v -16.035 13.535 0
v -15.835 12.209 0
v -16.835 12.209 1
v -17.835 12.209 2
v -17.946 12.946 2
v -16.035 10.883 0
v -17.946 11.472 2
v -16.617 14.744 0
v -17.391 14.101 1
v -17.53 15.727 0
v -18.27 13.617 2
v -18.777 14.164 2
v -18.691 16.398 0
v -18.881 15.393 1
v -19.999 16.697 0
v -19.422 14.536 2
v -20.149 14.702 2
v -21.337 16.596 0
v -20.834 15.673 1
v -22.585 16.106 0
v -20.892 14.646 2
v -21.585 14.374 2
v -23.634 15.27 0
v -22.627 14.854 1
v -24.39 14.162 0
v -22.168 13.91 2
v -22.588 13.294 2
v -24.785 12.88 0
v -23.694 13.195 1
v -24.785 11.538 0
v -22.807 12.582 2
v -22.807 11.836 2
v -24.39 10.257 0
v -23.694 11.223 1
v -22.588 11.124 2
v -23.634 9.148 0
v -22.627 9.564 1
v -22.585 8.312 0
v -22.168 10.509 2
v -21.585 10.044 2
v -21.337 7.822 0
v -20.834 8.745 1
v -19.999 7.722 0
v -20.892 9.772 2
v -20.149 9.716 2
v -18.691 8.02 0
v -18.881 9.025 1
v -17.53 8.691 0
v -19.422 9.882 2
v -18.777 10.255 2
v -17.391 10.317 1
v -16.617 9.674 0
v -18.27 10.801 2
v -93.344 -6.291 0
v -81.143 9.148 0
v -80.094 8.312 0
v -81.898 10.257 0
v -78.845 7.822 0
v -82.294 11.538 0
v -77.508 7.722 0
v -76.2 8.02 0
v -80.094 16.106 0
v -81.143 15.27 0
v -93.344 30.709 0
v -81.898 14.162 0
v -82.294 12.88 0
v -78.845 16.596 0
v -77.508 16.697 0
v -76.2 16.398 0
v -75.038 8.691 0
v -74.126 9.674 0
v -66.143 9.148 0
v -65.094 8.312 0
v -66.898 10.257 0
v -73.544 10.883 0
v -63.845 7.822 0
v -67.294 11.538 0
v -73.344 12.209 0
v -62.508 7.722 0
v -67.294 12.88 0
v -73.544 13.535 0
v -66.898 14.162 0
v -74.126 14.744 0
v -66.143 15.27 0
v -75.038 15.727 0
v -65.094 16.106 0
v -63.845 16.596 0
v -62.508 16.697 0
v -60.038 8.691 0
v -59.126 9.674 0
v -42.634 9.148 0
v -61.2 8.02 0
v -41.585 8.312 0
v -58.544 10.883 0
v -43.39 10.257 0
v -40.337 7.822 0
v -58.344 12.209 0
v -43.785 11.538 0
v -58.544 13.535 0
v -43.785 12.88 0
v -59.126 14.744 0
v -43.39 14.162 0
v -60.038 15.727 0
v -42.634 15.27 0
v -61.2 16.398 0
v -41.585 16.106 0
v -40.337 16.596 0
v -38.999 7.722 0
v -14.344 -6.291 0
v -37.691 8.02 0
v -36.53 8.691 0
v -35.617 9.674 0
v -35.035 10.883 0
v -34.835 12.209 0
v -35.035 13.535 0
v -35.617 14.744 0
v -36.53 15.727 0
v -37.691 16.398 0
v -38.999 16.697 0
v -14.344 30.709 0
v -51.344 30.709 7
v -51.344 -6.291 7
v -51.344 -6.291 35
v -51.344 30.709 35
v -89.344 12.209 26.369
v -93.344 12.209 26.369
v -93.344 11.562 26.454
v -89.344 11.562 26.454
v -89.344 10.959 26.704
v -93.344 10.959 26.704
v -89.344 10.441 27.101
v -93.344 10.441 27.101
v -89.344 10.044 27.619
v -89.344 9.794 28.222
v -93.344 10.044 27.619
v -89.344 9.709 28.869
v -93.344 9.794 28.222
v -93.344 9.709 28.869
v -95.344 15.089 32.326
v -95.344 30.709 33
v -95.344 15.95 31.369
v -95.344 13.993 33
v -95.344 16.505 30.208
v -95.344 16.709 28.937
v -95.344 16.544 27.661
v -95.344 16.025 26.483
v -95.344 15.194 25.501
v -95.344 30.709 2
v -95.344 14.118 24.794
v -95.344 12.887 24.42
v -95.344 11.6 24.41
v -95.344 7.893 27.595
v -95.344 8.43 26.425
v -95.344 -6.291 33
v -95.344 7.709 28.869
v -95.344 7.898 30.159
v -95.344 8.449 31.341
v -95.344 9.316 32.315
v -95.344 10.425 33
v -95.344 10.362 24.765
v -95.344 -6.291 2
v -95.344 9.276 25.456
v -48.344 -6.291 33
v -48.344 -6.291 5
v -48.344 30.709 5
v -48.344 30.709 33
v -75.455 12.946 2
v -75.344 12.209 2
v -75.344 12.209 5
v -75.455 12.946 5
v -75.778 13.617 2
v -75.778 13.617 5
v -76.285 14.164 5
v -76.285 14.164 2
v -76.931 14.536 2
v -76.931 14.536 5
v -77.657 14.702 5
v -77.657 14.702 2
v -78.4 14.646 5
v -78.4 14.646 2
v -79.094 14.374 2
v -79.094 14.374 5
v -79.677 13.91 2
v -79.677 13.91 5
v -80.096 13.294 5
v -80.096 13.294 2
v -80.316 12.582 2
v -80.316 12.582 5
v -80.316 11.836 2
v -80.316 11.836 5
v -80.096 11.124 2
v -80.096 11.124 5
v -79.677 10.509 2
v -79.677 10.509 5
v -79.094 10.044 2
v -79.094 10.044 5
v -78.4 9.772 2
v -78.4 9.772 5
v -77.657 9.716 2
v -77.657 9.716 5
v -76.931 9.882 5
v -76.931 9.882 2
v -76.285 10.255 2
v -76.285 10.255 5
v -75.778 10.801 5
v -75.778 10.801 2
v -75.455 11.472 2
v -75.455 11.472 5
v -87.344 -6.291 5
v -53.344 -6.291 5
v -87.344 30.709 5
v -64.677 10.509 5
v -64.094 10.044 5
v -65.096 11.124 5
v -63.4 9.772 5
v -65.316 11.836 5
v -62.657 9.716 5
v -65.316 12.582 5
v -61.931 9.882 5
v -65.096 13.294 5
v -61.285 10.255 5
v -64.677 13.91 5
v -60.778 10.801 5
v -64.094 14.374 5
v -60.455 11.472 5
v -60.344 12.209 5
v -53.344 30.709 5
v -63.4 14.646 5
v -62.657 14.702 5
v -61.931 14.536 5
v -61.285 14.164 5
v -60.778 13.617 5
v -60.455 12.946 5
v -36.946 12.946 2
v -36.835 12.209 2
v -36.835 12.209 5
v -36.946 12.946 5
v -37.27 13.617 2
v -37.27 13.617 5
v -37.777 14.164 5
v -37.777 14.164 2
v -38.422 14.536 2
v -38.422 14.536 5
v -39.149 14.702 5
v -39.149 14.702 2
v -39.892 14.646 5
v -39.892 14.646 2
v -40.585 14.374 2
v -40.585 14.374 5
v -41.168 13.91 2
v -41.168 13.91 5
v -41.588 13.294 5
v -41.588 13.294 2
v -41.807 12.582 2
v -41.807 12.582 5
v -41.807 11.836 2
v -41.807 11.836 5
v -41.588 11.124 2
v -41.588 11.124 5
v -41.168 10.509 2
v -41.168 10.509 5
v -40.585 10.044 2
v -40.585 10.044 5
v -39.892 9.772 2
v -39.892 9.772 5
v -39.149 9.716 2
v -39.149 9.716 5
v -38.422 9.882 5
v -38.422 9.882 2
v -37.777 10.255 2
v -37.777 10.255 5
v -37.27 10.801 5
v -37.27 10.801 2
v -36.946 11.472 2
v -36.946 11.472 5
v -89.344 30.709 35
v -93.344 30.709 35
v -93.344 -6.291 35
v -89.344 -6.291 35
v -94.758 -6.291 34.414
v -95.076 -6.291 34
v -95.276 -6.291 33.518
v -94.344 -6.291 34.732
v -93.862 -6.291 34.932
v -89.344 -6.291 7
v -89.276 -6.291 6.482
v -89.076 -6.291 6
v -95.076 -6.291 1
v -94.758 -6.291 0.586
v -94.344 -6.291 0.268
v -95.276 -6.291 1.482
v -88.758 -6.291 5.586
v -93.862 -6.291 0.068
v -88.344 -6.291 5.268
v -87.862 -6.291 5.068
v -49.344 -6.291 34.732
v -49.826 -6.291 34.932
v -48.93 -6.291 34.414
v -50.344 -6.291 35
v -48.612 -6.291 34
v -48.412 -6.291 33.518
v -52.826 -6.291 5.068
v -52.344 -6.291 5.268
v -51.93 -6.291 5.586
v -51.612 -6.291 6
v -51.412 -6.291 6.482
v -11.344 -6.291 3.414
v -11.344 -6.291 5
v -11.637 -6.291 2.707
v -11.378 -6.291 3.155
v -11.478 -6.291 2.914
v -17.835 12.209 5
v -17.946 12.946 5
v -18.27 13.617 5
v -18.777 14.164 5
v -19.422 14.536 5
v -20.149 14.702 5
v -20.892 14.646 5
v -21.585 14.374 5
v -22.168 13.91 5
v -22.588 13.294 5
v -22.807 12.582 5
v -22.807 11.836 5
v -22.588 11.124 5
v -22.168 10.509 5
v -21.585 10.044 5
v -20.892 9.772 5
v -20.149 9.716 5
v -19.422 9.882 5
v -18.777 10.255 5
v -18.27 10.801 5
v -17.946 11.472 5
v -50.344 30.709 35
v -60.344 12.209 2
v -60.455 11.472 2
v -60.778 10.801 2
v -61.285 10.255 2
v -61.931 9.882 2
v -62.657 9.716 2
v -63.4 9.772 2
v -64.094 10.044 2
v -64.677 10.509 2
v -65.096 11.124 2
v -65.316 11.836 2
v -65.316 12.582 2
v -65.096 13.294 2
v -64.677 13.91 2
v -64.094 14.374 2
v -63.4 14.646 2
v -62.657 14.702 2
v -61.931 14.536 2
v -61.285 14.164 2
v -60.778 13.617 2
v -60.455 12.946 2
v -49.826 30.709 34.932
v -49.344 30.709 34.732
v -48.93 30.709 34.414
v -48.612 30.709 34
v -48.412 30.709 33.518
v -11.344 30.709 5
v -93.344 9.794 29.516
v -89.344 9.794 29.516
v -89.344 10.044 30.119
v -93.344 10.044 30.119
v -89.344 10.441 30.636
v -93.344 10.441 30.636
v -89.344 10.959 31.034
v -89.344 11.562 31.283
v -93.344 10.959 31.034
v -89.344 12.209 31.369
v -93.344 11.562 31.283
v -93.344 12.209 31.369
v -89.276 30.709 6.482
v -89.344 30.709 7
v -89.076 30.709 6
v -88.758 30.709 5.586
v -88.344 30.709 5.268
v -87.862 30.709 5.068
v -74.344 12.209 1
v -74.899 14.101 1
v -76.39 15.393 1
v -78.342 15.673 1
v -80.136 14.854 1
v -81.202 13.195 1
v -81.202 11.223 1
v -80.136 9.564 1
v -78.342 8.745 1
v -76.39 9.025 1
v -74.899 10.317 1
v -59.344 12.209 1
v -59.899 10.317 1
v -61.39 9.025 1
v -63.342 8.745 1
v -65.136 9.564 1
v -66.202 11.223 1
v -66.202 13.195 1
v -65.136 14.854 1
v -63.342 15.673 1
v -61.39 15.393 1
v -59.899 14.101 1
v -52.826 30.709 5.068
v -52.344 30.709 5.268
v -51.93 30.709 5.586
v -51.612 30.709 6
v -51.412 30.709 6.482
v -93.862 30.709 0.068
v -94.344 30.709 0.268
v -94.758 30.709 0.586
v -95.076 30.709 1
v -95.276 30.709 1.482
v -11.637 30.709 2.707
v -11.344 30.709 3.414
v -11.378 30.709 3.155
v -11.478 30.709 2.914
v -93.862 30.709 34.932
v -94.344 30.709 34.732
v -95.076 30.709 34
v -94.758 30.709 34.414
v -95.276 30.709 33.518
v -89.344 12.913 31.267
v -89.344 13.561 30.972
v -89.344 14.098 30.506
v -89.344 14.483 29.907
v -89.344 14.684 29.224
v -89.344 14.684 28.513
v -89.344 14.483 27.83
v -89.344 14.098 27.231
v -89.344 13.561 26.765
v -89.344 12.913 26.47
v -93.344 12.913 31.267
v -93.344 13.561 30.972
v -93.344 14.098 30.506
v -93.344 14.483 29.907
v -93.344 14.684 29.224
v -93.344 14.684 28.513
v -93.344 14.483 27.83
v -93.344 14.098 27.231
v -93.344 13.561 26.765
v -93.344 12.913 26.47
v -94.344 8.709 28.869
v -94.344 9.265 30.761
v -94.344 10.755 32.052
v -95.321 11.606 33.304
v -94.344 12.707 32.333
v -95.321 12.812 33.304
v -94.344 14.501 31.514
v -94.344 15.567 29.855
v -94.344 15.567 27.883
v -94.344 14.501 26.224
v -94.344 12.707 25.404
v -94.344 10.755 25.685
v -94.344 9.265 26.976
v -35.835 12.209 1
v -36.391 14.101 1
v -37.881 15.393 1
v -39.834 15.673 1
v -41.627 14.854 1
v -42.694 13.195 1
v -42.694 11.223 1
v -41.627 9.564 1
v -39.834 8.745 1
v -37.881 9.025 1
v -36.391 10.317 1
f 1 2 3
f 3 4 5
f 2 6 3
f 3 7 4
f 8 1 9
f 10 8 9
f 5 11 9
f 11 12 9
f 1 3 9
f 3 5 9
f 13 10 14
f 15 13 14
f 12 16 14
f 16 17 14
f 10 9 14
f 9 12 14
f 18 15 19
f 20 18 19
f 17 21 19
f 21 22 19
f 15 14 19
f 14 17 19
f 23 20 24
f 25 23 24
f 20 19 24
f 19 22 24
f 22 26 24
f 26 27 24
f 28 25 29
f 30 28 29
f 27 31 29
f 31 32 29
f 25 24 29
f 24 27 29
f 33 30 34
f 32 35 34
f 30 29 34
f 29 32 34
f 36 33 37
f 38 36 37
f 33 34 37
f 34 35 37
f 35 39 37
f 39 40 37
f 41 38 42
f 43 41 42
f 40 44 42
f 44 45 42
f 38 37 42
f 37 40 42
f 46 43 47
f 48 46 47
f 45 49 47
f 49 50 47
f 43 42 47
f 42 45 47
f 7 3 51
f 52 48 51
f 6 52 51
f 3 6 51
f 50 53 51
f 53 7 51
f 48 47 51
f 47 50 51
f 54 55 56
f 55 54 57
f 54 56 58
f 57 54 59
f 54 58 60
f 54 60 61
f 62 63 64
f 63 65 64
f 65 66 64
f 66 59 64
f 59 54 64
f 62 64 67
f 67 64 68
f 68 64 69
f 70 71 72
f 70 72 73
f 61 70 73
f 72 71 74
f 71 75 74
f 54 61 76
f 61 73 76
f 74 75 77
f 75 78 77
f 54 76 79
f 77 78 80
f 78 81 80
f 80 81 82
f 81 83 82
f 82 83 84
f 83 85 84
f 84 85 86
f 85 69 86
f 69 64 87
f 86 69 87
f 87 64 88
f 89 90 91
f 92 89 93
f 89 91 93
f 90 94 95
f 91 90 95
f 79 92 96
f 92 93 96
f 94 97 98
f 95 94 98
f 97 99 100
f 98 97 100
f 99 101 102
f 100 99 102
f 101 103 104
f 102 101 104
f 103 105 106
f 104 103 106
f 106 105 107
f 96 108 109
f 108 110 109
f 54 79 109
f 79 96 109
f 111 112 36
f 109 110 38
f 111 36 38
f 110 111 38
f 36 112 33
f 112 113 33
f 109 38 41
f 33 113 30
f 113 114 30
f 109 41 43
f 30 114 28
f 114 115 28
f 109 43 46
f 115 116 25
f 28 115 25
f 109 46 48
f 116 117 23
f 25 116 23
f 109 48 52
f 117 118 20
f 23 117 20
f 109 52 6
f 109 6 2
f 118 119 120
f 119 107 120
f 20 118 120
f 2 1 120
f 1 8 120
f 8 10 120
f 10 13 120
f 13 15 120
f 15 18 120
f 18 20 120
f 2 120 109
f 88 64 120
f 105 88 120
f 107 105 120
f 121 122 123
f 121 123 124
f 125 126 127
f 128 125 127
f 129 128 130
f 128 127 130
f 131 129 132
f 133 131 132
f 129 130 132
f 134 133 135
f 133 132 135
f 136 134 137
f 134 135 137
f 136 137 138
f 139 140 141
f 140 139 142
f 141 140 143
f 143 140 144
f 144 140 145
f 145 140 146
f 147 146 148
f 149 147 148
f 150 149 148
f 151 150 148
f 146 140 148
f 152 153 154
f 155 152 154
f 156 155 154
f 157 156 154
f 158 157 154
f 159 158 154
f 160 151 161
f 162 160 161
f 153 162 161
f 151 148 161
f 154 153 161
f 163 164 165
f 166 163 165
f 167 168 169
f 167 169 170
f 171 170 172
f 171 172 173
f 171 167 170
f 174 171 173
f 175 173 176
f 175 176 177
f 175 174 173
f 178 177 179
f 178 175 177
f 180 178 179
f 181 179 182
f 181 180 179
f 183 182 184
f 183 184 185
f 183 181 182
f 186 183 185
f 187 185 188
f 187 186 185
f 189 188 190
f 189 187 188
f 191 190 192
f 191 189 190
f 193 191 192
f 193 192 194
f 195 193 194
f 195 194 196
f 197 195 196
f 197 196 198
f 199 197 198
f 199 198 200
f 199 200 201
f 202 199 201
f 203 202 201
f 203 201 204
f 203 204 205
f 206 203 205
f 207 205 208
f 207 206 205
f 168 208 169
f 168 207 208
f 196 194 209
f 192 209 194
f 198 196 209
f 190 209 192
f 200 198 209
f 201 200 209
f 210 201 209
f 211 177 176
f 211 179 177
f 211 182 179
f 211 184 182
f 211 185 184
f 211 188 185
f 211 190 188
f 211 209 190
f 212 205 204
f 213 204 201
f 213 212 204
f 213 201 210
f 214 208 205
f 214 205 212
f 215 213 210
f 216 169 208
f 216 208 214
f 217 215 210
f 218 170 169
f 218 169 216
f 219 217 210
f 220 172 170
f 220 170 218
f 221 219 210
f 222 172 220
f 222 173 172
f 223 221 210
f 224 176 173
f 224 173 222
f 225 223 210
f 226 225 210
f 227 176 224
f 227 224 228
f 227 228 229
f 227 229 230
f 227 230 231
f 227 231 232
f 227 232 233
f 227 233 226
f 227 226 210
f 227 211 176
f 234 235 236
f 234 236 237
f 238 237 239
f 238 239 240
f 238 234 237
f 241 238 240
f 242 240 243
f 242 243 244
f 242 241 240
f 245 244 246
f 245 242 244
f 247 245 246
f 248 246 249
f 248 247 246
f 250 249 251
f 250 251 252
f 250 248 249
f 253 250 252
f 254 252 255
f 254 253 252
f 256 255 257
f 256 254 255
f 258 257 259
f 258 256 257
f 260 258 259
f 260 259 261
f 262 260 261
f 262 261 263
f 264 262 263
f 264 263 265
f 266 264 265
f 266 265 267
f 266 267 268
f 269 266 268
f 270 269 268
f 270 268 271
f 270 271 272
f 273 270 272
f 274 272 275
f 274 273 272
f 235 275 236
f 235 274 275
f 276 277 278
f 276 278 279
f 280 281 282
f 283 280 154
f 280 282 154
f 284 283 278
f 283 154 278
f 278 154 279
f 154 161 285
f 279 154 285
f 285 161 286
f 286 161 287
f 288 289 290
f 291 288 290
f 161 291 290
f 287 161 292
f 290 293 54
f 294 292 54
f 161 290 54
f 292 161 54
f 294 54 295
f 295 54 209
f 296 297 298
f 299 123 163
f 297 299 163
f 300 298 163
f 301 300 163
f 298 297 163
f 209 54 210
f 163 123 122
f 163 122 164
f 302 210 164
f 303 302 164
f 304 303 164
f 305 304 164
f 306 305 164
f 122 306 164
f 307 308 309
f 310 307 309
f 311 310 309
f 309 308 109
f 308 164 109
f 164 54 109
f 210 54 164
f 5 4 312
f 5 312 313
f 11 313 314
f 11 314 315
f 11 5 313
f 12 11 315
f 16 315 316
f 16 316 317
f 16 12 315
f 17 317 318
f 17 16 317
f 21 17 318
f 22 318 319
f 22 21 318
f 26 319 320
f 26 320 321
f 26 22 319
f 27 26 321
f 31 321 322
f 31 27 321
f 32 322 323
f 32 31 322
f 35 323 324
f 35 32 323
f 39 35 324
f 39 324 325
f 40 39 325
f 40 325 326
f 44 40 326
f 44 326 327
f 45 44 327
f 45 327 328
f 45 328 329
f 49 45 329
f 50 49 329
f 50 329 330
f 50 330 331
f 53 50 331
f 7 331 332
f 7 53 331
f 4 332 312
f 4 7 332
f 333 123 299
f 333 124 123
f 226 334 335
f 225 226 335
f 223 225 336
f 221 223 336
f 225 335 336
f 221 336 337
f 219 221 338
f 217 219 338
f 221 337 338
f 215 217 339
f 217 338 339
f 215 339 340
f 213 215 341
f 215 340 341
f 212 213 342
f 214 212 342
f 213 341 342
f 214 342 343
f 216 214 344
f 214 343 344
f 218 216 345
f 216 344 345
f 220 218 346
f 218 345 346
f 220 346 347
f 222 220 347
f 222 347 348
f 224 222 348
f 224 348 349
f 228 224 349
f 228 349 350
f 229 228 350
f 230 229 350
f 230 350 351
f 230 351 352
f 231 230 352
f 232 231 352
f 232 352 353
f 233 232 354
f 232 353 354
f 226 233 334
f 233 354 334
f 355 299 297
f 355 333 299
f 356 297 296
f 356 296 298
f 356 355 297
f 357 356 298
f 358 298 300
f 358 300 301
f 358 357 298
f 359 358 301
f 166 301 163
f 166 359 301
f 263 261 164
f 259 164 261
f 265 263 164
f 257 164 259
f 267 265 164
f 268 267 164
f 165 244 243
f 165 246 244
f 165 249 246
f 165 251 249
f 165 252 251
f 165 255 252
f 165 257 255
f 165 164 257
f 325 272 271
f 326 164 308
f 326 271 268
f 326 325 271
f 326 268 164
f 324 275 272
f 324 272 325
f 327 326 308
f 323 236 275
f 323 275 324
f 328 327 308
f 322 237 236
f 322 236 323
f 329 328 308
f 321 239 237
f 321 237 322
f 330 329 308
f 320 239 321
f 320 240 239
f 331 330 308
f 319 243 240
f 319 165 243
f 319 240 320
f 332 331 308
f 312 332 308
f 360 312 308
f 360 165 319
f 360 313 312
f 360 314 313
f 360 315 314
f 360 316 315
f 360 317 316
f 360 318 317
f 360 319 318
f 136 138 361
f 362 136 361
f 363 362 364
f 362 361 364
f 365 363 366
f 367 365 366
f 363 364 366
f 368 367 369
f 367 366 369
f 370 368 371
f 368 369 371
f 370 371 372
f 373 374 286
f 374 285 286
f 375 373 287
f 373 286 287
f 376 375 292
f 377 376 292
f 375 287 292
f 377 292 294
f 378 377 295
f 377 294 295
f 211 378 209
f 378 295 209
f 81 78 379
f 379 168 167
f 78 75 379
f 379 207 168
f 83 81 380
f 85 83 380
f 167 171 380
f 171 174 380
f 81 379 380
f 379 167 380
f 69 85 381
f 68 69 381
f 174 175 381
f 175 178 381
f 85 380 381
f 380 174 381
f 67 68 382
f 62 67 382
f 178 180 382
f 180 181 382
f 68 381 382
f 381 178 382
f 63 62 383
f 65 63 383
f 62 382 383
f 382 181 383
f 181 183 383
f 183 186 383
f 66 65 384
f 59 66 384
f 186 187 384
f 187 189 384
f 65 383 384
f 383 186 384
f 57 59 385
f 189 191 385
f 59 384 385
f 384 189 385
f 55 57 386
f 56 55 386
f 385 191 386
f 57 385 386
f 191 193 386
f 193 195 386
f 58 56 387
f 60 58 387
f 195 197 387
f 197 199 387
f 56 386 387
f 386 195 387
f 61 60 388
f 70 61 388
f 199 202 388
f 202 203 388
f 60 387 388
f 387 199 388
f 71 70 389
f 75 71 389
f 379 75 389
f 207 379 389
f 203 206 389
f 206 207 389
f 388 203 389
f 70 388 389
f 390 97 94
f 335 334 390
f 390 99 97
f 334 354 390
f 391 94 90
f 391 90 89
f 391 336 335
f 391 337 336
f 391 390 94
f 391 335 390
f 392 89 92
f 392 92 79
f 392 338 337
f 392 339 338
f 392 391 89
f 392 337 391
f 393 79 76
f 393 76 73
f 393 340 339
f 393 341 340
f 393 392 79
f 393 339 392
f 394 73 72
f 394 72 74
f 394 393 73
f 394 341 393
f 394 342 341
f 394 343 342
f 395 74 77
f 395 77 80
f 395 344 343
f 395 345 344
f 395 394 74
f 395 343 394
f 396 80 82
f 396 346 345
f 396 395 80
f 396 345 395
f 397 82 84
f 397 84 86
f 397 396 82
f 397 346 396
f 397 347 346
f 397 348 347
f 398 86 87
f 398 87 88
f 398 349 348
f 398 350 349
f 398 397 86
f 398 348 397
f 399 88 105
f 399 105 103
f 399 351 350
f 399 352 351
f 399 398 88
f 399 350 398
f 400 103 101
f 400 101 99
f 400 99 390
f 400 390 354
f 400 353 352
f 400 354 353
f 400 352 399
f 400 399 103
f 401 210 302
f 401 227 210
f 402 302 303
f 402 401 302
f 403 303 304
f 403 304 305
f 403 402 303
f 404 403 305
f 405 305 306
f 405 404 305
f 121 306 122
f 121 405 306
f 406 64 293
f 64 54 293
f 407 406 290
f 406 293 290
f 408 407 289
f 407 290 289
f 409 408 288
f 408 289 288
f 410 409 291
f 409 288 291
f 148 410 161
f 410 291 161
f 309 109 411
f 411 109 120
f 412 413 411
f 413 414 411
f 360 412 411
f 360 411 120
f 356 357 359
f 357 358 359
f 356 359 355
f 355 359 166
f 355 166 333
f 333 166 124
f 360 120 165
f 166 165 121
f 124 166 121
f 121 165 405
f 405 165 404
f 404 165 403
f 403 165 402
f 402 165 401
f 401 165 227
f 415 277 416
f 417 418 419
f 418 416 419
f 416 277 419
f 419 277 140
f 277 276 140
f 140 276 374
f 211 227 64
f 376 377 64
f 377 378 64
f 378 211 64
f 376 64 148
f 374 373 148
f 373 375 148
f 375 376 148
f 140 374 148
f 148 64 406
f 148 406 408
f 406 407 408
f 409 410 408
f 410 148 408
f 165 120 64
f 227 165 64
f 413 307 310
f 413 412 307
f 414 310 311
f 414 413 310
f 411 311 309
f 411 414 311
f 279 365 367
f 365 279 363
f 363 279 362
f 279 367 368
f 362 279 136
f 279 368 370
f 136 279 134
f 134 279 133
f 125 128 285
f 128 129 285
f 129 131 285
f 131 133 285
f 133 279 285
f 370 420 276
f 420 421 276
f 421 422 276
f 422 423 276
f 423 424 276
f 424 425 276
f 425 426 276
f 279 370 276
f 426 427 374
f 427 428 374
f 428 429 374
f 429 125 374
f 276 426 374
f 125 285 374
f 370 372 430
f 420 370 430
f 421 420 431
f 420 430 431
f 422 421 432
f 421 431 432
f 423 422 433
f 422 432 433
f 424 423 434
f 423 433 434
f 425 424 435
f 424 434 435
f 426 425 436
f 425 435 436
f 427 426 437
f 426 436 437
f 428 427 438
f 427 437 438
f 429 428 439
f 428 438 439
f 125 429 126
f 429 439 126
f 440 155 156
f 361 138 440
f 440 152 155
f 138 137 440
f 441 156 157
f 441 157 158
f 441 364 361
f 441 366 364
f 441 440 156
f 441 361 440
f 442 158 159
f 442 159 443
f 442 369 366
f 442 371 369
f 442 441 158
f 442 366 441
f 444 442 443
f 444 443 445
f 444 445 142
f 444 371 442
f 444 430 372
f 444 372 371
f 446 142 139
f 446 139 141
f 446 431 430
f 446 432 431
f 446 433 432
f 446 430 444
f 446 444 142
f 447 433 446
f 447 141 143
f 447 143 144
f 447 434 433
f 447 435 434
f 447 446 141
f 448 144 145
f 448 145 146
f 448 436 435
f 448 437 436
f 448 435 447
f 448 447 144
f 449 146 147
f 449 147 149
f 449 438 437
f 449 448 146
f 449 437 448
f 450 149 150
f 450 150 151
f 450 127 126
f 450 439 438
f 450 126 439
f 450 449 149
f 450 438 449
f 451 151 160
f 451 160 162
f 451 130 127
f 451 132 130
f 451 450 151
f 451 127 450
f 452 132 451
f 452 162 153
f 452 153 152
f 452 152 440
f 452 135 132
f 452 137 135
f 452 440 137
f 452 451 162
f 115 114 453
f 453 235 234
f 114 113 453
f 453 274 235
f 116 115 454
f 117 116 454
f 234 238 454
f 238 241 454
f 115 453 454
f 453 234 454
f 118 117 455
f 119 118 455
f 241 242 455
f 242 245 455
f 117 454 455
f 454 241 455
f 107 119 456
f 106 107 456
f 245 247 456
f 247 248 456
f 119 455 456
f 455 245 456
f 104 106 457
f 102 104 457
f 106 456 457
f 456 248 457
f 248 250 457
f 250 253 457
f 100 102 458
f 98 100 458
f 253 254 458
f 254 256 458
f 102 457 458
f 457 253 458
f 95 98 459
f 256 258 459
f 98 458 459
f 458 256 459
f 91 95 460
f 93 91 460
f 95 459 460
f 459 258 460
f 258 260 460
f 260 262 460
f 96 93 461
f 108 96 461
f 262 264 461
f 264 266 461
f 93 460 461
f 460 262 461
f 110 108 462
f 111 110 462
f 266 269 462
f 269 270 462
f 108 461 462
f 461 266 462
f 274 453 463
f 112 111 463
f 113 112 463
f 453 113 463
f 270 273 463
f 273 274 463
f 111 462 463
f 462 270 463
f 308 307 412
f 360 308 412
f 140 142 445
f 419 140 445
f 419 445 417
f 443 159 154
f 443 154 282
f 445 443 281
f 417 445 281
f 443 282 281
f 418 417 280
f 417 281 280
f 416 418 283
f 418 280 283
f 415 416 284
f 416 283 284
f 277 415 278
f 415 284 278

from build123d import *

# Parameters (mm, degrees)
F1_DEPTH = 35
F0_W     = 3
F0_H     = 37
F0_R     = 2.5
F0_W_2   = 37
F2_DEPTH = 5
F3_R     = 2
F4_SIZE  = 3
F5_R     = 1
F6_SIZE  = 2
F7_R     = 2
F9_DEPTH = 12.5


# Not quite as in the source:
# - a fillet or chamfer that OpenCascade refuses, or shapes differently, is made with other operations: its cross-section is extruded or revolved along the edge and cut away or added
# - a feature names something its author has since deleted; it is built from what else it names


with BuildPart() as f1:
    # F0 (on Top) → F1 (new body)
    with BuildSketch(Plane.XY):
        Polygon((-89.3438757165, 12.2090974661), (-89.3438757165, 30.7090974661), (-95.3438757165, 30.7090974661), (-95.3438757165, -6.2909025339), (-89.3438757165, -6.2909025339), align=None)
    extrude(amount=F1_DEPTH)



with BuildPart() as f1b:
    # F0 (on Top) → F1, piece 2 (new body)
    with BuildSketch(Plane.XY):
        with Locations((-49.8438757165, 12.2090974661)):
            Rectangle(F0_W, F0_H)
    extrude(amount=F1_DEPTH)


with BuildPart() as f1_1:
    add(f1.part)

    add(f1b.part)  # F2 merges F1b
    # F0 (on Top) → F2 (join)
    with BuildSketch(Plane.XY):
        Polygon((-51.3438757165, 30.7090974661), (-89.3438757165, 30.7090974661), (-89.3438757165, 12.2090974661), (-89.3438757165, -6.2909025339), (-51.3438757165, -6.2909025339), align=None)
        with Locations((-77.8438757165, 12.2090974661)):
            Circle(F0_R, mode=Mode.SUBTRACT)
        with BuildLine():
            ThreePointArc((-65.3438757165, 12.2090974661), (-62.8438757165, 14.7090974661), (-60.3438757165, 12.2090974661))
            ThreePointArc((-60.3438757165, 12.2090974661), (-62.8438757165, 9.7090974661), (-65.3438757165, 12.2090974661))
        make_face(mode=Mode.SUBTRACT)
        with Locations((-29.8438757165, 12.2090974661)):
            Rectangle(F0_W_2, F0_H)
        with Locations((-39.3354164958, 12.2090974661)):
            Circle(F0_R, mode=Mode.SUBTRACT)
        with Locations((-20.3354164958, 12.2090974661)):
            Circle(F0_R, mode=Mode.SUBTRACT)
    extrude(amount=F2_DEPTH)

    # F3
    f3_edges = [f1_1.edges().sort_by_distance(p)[0] for p in [
        (-89.343876, 12.209097, 5),
        (-51.343876, 12.209097, 5),
        (-48.343876, 12.209097, 35),
    ]]
    fillet(f3_edges, radius=F3_R)

    # F4
    f4_edges = [f1_1.edges().sort_by_distance(p)[0] for p in [
        (-11.343876, 12.209097, 0),
    ]]
    chamfer(f4_edges, length=F4_SIZE)

    # F5
    f5_edges = [f1_1.edges().sort_by_distance(p)[0] for p in [
        (-11.343876, 12.209097, 3),
    ]]
    fillet(f5_edges, radius=F5_R)

    # F6
    f6_edges = [f1_1.edges().sort_by_distance(p)[0] for p in [
        (-65.343876, 12.209097, 0),
        (-41.835416, 12.209097, 0),
        (-22.835416, 12.209097, 0),
        (-80.343876, 12.209097, 0),
    ]]
    chamfer(f6_edges, length=F6_SIZE)

    # F7
    f7_edges = [f1_1.edges().sort_by_distance(p)[0] for p in [
        (-95.343876, 12.209097, 35),
        (-95.343876, 12.209097, 0),
    ]]
    fillet(f7_edges, radius=F7_R)

    # F8 (on face) → F9 (cut, symmetric)
    with BuildSketch(Plane(origin=(-95.3438757165, 0, 0), x_dir=(0, -1, 0), z_dir=(-1, 0, 0))):
        with BuildLine():
            ThreePointArc((-9.7090974661, 28.8686309451), (-10.4413305132, 30.636397898), (-12.2090974661, 31.3686309451))
            Line((-12.2090974661, 31.3686309451), (-12.2090974661, 26.3686309451))
            ThreePointArc((-12.2090974661, 26.3686309451), (-10.4413305132, 27.1008639921), (-9.7090974661, 28.8686309451))
        make_face()
        with BuildLine():
            Line((-12.2090974661, 26.3686309451), (-12.2090974661, 31.3686309451))
            ThreePointArc((-12.2090974661, 31.3686309451), (-14.7090974661, 28.8686309451), (-12.2090974661, 26.3686309451))
        make_face()
    extrude(amount=F9_DEPTH, both=True, mode=Mode.SUBTRACT)

    # F10: chamfer of 2 on 1 edges, made by hand

    # F10_s1 → F10_t2 (revolve, cut)
    with BuildSketch(Plane.XY.offset(28.8686309451)):
        Polygon((-95.3438757165, 7.7090974661), (-93.3438757165, 9.7090974661), (-95.3438757165, 9.7090974661), align=None)
    revolve(axis=Axis((-95.3438757165, 12.2090974661, 28.8686309451), (-1, 0, 0)), mode=Mode.SUBTRACT)


solid = f1_1.part
